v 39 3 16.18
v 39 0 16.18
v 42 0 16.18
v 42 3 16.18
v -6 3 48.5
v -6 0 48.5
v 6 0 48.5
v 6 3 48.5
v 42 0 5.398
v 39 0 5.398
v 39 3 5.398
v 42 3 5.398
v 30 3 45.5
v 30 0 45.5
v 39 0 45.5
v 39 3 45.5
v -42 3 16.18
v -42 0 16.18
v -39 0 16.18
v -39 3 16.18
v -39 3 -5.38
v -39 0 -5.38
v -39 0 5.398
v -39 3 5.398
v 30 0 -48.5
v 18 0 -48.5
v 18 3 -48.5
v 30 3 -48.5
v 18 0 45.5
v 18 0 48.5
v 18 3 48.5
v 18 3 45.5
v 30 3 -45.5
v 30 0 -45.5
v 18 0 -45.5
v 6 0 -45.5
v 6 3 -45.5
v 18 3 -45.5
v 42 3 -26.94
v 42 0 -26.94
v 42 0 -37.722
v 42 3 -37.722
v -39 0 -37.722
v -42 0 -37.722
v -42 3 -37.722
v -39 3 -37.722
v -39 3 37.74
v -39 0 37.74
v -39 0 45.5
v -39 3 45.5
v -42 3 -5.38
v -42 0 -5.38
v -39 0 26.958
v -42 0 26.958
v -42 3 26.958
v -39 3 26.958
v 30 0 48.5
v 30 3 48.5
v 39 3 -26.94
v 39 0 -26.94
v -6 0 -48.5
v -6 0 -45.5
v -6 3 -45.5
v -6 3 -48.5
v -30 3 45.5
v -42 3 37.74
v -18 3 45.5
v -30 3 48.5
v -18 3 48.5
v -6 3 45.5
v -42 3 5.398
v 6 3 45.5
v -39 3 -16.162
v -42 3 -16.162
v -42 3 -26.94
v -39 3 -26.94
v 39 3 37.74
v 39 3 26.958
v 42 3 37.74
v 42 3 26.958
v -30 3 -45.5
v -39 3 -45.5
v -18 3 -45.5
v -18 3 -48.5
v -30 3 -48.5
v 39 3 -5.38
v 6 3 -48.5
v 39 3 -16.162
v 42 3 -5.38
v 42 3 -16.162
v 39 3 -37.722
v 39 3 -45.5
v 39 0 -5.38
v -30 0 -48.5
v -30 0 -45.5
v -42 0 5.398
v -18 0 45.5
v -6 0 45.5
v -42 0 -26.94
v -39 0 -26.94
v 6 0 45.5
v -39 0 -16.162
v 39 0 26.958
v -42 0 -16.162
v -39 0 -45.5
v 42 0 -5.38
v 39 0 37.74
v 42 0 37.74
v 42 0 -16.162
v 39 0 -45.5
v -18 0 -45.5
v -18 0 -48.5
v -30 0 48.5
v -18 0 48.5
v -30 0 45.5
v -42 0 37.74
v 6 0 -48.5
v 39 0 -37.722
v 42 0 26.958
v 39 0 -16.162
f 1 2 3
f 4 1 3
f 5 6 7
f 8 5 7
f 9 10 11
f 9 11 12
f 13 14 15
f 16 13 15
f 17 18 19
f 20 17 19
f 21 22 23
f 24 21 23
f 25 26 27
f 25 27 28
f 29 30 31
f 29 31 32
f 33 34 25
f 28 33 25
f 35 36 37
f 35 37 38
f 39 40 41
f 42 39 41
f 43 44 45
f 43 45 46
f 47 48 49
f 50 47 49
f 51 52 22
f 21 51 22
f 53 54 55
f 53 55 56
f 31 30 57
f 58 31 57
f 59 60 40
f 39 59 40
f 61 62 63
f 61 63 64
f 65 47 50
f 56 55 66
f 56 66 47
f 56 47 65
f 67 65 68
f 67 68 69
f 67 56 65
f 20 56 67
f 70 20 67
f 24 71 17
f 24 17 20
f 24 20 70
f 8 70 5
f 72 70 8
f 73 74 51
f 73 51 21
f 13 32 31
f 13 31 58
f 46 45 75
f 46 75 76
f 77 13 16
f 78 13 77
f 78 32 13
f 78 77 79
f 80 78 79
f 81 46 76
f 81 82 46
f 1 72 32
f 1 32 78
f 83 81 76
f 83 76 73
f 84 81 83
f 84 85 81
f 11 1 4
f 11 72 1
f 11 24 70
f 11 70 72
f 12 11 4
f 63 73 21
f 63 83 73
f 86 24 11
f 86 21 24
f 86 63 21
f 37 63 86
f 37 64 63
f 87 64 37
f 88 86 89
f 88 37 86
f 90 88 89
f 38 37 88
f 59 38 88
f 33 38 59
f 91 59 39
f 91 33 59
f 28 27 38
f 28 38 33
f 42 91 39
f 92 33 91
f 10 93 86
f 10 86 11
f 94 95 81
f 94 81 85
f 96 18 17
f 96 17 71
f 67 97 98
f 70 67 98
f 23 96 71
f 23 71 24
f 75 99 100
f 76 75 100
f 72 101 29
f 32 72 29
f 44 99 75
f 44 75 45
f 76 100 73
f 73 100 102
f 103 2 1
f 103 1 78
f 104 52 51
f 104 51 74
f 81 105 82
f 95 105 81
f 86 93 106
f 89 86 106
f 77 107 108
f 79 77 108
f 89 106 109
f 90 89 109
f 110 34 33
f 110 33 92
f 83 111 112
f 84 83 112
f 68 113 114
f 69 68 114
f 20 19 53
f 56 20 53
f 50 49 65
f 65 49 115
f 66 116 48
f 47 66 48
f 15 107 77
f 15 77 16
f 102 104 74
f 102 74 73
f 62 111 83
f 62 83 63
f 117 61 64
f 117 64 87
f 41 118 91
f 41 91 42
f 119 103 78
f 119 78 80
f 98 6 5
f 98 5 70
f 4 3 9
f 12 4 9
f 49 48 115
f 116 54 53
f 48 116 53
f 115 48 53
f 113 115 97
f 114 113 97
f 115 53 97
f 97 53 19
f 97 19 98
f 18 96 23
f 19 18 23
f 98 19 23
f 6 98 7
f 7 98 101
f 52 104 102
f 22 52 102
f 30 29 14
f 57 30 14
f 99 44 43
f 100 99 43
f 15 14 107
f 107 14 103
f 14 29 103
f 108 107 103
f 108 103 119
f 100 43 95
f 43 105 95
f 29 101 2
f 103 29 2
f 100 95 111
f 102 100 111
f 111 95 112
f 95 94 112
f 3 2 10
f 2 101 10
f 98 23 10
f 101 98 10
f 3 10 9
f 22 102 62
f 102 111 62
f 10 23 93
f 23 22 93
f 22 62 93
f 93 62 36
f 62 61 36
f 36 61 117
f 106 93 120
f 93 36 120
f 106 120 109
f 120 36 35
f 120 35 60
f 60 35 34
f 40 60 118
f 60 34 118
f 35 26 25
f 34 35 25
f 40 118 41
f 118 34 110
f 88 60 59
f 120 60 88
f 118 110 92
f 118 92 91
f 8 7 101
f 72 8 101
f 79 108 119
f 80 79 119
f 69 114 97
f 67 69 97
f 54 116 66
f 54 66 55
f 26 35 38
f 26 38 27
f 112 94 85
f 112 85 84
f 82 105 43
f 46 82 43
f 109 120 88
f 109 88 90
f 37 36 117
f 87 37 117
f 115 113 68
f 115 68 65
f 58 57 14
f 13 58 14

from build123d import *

# Parameters (mm, degrees)
ESBO_O1_W                = 84
ESBO_O1_H                = 97
RESSALTO_EXTRUS_O1_DEPTH = 3
ESBO_O2_W                = 3
ESBO_O2_H                = 10.777777778
CORTE_EXTRUS_O4_DEPTH    = 3
CORTE_EXTRUS_O9_REACH    = 66.228
ESBO_O5_W                = 12
ESBO_O5_H                = 3


with BuildPart() as part:
    # Esboço1 → Ressalto-extrusão1 (new body)
    with BuildSketch(Plane(origin=(0, 0, 0), x_dir=(1, 0, 0), z_dir=(0, 1, 0))):
        Rectangle(ESBO_O1_W, ESBO_O1_H)
    extrude(amount=RESSALTO_EXTRUS_O1_DEPTH)

    # Esboço2 → Corte-extrusão4 (cut)
    with BuildSketch(Plane.XZ):
        with Locations((-40.5, -43.111111111)):
            Rectangle(ESBO_O2_W, ESBO_O2_H)
        with Locations((40.5, -43.111111111)):
            Rectangle(ESBO_O2_W, ESBO_O2_H)
        with Locations((40.5, -21.551111111)):
            Rectangle(ESBO_O2_W, ESBO_O2_H)
        with Locations((40.5, 0.008888889)):
            Rectangle(ESBO_O2_W, ESBO_O2_H)
        with Locations((40.5, 21.568888889)):
            Rectangle(ESBO_O2_W, ESBO_O2_H)
        with Locations((40.5, 43.128888889)):
            Rectangle(ESBO_O2_W, ESBO_O2_H)
        with Locations((-40.5, -21.551111111)):
            Rectangle(ESBO_O2_W, ESBO_O2_H)
        with Locations((-40.5, 0.008888889)):
            Rectangle(ESBO_O2_W, ESBO_O2_H)
        with Locations((-40.5, 21.568888889)):
            Rectangle(ESBO_O2_W, ESBO_O2_H)
        with Locations((-40.5, 43.128888889)):
            Rectangle(ESBO_O2_W, ESBO_O2_H)
    extrude(amount=-CORTE_EXTRUS_O4_DEPTH, mode=Mode.SUBTRACT)

    # Esboço5 → Corte-extrusão9 (cut, up to next)
    with BuildSketch(Plane(origin=(0, 0, 0), x_dir=(1, 0, 0), z_dir=(0, 1, 0)), mode=Mode.PRIVATE) as corte_extrus_o9_sk1:
        with Locations((-36, 47)):
            Rectangle(ESBO_O5_W, ESBO_O5_H)
    corte_extrus_o9_tool1 = extrude(corte_extrus_o9_sk1.sketch, amount=CORTE_EXTRUS_O9_REACH, mode=Mode.PRIVATE) & part.part
    # Esboço5 → Corte-extrusão9 (cut, up to next)
    with BuildSketch(Plane(origin=(0, 0, 0), x_dir=(1, 0, 0), z_dir=(0, 1, 0)), mode=Mode.PRIVATE) as corte_extrus_o9_sk2:
        with Locations((-36, -47)):
            Rectangle(ESBO_O5_W, ESBO_O5_H)
    corte_extrus_o9_tool2 = extrude(corte_extrus_o9_sk2.sketch, amount=CORTE_EXTRUS_O9_REACH, mode=Mode.PRIVATE) & part.part
    # Esboço5 → Corte-extrusão9 (cut, up to next)
    with BuildSketch(Plane(origin=(0, 0, 0), x_dir=(1, 0, 0), z_dir=(0, 1, 0)), mode=Mode.PRIVATE) as corte_extrus_o9_sk3:
        with Locations((36, -47)):
            Rectangle(ESBO_O5_W, ESBO_O5_H)
    corte_extrus_o9_tool3 = extrude(corte_extrus_o9_sk3.sketch, amount=CORTE_EXTRUS_O9_REACH, mode=Mode.PRIVATE) & part.part
    # Esboço5 → Corte-extrusão9 (cut, up to next)
    with BuildSketch(Plane(origin=(0, 0, 0), x_dir=(1, 0, 0), z_dir=(0, 1, 0)), mode=Mode.PRIVATE) as corte_extrus_o9_sk4:
        with Locations((36, 47)):
            Rectangle(ESBO_O5_W, ESBO_O5_H)
    corte_extrus_o9_tool4 = extrude(corte_extrus_o9_sk4.sketch, amount=CORTE_EXTRUS_O9_REACH, mode=Mode.PRIVATE) & part.part
    # Esboço5 → Corte-extrusão9 (cut, up to next)
    with BuildSketch(Plane(origin=(0, 0, 0), x_dir=(1, 0, 0), z_dir=(0, 1, 0)), mode=Mode.PRIVATE) as corte_extrus_o9_sk5:
        with Locations((-12, -47)):
            Rectangle(ESBO_O5_W, ESBO_O5_H)
    corte_extrus_o9_tool5 = extrude(corte_extrus_o9_sk5.sketch, amount=CORTE_EXTRUS_O9_REACH, mode=Mode.PRIVATE) & part.part
    # Esboço5 → Corte-extrusão9 (cut, up to next)
    with BuildSketch(Plane(origin=(0, 0, 0), x_dir=(1, 0, 0), z_dir=(0, 1, 0)), mode=Mode.PRIVATE) as corte_extrus_o9_sk6:
        with Locations((12, -47)):
            Rectangle(ESBO_O5_W, ESBO_O5_H)
    corte_extrus_o9_tool6 = extrude(corte_extrus_o9_sk6.sketch, amount=CORTE_EXTRUS_O9_REACH, mode=Mode.PRIVATE) & part.part
    # Esboço5 → Corte-extrusão9 (cut, up to next)
    with BuildSketch(Plane(origin=(0, 0, 0), x_dir=(1, 0, 0), z_dir=(0, 1, 0)), mode=Mode.PRIVATE) as corte_extrus_o9_sk7:
        with Locations((-12, 47)):
            Rectangle(ESBO_O5_W, ESBO_O5_H)
    corte_extrus_o9_tool7 = extrude(corte_extrus_o9_sk7.sketch, amount=CORTE_EXTRUS_O9_REACH, mode=Mode.PRIVATE) & part.part
    # Esboço5 → Corte-extrusão9 (cut, up to next)
    with BuildSketch(Plane(origin=(0, 0, 0), x_dir=(1, 0, 0), z_dir=(0, 1, 0)), mode=Mode.PRIVATE) as corte_extrus_o9_sk8:
        with Locations((12, 47)):
            Rectangle(ESBO_O5_W, ESBO_O5_H)
    corte_extrus_o9_tool8 = extrude(corte_extrus_o9_sk8.sketch, amount=CORTE_EXTRUS_O9_REACH, mode=Mode.PRIVATE) & part.part
    add(corte_extrus_o9_tool1.solids().sort_by_distance((-36, 0, -47))[0], mode=Mode.SUBTRACT)
    add(corte_extrus_o9_tool2.solids().sort_by_distance((-36, 0, 47))[0], mode=Mode.SUBTRACT)
    add(corte_extrus_o9_tool3.solids().sort_by_distance((36, 0, 47))[0], mode=Mode.SUBTRACT)
    add(corte_extrus_o9_tool4.solids().sort_by_distance((36, 0, -47))[0], mode=Mode.SUBTRACT)
    add(corte_extrus_o9_tool5.solids().sort_by_distance((-12, 0, 47))[0], mode=Mode.SUBTRACT)
    add(corte_extrus_o9_tool6.solids().sort_by_distance((12, 0, 47))[0], mode=Mode.SUBTRACT)
    add(corte_extrus_o9_tool7.solids().sort_by_distance((-12, 0, -47))[0], mode=Mode.SUBTRACT)
    add(corte_extrus_o9_tool8.solids().sort_by_distance((12, 0, -47))[0], mode=Mode.SUBTRACT)


solid = part.part
